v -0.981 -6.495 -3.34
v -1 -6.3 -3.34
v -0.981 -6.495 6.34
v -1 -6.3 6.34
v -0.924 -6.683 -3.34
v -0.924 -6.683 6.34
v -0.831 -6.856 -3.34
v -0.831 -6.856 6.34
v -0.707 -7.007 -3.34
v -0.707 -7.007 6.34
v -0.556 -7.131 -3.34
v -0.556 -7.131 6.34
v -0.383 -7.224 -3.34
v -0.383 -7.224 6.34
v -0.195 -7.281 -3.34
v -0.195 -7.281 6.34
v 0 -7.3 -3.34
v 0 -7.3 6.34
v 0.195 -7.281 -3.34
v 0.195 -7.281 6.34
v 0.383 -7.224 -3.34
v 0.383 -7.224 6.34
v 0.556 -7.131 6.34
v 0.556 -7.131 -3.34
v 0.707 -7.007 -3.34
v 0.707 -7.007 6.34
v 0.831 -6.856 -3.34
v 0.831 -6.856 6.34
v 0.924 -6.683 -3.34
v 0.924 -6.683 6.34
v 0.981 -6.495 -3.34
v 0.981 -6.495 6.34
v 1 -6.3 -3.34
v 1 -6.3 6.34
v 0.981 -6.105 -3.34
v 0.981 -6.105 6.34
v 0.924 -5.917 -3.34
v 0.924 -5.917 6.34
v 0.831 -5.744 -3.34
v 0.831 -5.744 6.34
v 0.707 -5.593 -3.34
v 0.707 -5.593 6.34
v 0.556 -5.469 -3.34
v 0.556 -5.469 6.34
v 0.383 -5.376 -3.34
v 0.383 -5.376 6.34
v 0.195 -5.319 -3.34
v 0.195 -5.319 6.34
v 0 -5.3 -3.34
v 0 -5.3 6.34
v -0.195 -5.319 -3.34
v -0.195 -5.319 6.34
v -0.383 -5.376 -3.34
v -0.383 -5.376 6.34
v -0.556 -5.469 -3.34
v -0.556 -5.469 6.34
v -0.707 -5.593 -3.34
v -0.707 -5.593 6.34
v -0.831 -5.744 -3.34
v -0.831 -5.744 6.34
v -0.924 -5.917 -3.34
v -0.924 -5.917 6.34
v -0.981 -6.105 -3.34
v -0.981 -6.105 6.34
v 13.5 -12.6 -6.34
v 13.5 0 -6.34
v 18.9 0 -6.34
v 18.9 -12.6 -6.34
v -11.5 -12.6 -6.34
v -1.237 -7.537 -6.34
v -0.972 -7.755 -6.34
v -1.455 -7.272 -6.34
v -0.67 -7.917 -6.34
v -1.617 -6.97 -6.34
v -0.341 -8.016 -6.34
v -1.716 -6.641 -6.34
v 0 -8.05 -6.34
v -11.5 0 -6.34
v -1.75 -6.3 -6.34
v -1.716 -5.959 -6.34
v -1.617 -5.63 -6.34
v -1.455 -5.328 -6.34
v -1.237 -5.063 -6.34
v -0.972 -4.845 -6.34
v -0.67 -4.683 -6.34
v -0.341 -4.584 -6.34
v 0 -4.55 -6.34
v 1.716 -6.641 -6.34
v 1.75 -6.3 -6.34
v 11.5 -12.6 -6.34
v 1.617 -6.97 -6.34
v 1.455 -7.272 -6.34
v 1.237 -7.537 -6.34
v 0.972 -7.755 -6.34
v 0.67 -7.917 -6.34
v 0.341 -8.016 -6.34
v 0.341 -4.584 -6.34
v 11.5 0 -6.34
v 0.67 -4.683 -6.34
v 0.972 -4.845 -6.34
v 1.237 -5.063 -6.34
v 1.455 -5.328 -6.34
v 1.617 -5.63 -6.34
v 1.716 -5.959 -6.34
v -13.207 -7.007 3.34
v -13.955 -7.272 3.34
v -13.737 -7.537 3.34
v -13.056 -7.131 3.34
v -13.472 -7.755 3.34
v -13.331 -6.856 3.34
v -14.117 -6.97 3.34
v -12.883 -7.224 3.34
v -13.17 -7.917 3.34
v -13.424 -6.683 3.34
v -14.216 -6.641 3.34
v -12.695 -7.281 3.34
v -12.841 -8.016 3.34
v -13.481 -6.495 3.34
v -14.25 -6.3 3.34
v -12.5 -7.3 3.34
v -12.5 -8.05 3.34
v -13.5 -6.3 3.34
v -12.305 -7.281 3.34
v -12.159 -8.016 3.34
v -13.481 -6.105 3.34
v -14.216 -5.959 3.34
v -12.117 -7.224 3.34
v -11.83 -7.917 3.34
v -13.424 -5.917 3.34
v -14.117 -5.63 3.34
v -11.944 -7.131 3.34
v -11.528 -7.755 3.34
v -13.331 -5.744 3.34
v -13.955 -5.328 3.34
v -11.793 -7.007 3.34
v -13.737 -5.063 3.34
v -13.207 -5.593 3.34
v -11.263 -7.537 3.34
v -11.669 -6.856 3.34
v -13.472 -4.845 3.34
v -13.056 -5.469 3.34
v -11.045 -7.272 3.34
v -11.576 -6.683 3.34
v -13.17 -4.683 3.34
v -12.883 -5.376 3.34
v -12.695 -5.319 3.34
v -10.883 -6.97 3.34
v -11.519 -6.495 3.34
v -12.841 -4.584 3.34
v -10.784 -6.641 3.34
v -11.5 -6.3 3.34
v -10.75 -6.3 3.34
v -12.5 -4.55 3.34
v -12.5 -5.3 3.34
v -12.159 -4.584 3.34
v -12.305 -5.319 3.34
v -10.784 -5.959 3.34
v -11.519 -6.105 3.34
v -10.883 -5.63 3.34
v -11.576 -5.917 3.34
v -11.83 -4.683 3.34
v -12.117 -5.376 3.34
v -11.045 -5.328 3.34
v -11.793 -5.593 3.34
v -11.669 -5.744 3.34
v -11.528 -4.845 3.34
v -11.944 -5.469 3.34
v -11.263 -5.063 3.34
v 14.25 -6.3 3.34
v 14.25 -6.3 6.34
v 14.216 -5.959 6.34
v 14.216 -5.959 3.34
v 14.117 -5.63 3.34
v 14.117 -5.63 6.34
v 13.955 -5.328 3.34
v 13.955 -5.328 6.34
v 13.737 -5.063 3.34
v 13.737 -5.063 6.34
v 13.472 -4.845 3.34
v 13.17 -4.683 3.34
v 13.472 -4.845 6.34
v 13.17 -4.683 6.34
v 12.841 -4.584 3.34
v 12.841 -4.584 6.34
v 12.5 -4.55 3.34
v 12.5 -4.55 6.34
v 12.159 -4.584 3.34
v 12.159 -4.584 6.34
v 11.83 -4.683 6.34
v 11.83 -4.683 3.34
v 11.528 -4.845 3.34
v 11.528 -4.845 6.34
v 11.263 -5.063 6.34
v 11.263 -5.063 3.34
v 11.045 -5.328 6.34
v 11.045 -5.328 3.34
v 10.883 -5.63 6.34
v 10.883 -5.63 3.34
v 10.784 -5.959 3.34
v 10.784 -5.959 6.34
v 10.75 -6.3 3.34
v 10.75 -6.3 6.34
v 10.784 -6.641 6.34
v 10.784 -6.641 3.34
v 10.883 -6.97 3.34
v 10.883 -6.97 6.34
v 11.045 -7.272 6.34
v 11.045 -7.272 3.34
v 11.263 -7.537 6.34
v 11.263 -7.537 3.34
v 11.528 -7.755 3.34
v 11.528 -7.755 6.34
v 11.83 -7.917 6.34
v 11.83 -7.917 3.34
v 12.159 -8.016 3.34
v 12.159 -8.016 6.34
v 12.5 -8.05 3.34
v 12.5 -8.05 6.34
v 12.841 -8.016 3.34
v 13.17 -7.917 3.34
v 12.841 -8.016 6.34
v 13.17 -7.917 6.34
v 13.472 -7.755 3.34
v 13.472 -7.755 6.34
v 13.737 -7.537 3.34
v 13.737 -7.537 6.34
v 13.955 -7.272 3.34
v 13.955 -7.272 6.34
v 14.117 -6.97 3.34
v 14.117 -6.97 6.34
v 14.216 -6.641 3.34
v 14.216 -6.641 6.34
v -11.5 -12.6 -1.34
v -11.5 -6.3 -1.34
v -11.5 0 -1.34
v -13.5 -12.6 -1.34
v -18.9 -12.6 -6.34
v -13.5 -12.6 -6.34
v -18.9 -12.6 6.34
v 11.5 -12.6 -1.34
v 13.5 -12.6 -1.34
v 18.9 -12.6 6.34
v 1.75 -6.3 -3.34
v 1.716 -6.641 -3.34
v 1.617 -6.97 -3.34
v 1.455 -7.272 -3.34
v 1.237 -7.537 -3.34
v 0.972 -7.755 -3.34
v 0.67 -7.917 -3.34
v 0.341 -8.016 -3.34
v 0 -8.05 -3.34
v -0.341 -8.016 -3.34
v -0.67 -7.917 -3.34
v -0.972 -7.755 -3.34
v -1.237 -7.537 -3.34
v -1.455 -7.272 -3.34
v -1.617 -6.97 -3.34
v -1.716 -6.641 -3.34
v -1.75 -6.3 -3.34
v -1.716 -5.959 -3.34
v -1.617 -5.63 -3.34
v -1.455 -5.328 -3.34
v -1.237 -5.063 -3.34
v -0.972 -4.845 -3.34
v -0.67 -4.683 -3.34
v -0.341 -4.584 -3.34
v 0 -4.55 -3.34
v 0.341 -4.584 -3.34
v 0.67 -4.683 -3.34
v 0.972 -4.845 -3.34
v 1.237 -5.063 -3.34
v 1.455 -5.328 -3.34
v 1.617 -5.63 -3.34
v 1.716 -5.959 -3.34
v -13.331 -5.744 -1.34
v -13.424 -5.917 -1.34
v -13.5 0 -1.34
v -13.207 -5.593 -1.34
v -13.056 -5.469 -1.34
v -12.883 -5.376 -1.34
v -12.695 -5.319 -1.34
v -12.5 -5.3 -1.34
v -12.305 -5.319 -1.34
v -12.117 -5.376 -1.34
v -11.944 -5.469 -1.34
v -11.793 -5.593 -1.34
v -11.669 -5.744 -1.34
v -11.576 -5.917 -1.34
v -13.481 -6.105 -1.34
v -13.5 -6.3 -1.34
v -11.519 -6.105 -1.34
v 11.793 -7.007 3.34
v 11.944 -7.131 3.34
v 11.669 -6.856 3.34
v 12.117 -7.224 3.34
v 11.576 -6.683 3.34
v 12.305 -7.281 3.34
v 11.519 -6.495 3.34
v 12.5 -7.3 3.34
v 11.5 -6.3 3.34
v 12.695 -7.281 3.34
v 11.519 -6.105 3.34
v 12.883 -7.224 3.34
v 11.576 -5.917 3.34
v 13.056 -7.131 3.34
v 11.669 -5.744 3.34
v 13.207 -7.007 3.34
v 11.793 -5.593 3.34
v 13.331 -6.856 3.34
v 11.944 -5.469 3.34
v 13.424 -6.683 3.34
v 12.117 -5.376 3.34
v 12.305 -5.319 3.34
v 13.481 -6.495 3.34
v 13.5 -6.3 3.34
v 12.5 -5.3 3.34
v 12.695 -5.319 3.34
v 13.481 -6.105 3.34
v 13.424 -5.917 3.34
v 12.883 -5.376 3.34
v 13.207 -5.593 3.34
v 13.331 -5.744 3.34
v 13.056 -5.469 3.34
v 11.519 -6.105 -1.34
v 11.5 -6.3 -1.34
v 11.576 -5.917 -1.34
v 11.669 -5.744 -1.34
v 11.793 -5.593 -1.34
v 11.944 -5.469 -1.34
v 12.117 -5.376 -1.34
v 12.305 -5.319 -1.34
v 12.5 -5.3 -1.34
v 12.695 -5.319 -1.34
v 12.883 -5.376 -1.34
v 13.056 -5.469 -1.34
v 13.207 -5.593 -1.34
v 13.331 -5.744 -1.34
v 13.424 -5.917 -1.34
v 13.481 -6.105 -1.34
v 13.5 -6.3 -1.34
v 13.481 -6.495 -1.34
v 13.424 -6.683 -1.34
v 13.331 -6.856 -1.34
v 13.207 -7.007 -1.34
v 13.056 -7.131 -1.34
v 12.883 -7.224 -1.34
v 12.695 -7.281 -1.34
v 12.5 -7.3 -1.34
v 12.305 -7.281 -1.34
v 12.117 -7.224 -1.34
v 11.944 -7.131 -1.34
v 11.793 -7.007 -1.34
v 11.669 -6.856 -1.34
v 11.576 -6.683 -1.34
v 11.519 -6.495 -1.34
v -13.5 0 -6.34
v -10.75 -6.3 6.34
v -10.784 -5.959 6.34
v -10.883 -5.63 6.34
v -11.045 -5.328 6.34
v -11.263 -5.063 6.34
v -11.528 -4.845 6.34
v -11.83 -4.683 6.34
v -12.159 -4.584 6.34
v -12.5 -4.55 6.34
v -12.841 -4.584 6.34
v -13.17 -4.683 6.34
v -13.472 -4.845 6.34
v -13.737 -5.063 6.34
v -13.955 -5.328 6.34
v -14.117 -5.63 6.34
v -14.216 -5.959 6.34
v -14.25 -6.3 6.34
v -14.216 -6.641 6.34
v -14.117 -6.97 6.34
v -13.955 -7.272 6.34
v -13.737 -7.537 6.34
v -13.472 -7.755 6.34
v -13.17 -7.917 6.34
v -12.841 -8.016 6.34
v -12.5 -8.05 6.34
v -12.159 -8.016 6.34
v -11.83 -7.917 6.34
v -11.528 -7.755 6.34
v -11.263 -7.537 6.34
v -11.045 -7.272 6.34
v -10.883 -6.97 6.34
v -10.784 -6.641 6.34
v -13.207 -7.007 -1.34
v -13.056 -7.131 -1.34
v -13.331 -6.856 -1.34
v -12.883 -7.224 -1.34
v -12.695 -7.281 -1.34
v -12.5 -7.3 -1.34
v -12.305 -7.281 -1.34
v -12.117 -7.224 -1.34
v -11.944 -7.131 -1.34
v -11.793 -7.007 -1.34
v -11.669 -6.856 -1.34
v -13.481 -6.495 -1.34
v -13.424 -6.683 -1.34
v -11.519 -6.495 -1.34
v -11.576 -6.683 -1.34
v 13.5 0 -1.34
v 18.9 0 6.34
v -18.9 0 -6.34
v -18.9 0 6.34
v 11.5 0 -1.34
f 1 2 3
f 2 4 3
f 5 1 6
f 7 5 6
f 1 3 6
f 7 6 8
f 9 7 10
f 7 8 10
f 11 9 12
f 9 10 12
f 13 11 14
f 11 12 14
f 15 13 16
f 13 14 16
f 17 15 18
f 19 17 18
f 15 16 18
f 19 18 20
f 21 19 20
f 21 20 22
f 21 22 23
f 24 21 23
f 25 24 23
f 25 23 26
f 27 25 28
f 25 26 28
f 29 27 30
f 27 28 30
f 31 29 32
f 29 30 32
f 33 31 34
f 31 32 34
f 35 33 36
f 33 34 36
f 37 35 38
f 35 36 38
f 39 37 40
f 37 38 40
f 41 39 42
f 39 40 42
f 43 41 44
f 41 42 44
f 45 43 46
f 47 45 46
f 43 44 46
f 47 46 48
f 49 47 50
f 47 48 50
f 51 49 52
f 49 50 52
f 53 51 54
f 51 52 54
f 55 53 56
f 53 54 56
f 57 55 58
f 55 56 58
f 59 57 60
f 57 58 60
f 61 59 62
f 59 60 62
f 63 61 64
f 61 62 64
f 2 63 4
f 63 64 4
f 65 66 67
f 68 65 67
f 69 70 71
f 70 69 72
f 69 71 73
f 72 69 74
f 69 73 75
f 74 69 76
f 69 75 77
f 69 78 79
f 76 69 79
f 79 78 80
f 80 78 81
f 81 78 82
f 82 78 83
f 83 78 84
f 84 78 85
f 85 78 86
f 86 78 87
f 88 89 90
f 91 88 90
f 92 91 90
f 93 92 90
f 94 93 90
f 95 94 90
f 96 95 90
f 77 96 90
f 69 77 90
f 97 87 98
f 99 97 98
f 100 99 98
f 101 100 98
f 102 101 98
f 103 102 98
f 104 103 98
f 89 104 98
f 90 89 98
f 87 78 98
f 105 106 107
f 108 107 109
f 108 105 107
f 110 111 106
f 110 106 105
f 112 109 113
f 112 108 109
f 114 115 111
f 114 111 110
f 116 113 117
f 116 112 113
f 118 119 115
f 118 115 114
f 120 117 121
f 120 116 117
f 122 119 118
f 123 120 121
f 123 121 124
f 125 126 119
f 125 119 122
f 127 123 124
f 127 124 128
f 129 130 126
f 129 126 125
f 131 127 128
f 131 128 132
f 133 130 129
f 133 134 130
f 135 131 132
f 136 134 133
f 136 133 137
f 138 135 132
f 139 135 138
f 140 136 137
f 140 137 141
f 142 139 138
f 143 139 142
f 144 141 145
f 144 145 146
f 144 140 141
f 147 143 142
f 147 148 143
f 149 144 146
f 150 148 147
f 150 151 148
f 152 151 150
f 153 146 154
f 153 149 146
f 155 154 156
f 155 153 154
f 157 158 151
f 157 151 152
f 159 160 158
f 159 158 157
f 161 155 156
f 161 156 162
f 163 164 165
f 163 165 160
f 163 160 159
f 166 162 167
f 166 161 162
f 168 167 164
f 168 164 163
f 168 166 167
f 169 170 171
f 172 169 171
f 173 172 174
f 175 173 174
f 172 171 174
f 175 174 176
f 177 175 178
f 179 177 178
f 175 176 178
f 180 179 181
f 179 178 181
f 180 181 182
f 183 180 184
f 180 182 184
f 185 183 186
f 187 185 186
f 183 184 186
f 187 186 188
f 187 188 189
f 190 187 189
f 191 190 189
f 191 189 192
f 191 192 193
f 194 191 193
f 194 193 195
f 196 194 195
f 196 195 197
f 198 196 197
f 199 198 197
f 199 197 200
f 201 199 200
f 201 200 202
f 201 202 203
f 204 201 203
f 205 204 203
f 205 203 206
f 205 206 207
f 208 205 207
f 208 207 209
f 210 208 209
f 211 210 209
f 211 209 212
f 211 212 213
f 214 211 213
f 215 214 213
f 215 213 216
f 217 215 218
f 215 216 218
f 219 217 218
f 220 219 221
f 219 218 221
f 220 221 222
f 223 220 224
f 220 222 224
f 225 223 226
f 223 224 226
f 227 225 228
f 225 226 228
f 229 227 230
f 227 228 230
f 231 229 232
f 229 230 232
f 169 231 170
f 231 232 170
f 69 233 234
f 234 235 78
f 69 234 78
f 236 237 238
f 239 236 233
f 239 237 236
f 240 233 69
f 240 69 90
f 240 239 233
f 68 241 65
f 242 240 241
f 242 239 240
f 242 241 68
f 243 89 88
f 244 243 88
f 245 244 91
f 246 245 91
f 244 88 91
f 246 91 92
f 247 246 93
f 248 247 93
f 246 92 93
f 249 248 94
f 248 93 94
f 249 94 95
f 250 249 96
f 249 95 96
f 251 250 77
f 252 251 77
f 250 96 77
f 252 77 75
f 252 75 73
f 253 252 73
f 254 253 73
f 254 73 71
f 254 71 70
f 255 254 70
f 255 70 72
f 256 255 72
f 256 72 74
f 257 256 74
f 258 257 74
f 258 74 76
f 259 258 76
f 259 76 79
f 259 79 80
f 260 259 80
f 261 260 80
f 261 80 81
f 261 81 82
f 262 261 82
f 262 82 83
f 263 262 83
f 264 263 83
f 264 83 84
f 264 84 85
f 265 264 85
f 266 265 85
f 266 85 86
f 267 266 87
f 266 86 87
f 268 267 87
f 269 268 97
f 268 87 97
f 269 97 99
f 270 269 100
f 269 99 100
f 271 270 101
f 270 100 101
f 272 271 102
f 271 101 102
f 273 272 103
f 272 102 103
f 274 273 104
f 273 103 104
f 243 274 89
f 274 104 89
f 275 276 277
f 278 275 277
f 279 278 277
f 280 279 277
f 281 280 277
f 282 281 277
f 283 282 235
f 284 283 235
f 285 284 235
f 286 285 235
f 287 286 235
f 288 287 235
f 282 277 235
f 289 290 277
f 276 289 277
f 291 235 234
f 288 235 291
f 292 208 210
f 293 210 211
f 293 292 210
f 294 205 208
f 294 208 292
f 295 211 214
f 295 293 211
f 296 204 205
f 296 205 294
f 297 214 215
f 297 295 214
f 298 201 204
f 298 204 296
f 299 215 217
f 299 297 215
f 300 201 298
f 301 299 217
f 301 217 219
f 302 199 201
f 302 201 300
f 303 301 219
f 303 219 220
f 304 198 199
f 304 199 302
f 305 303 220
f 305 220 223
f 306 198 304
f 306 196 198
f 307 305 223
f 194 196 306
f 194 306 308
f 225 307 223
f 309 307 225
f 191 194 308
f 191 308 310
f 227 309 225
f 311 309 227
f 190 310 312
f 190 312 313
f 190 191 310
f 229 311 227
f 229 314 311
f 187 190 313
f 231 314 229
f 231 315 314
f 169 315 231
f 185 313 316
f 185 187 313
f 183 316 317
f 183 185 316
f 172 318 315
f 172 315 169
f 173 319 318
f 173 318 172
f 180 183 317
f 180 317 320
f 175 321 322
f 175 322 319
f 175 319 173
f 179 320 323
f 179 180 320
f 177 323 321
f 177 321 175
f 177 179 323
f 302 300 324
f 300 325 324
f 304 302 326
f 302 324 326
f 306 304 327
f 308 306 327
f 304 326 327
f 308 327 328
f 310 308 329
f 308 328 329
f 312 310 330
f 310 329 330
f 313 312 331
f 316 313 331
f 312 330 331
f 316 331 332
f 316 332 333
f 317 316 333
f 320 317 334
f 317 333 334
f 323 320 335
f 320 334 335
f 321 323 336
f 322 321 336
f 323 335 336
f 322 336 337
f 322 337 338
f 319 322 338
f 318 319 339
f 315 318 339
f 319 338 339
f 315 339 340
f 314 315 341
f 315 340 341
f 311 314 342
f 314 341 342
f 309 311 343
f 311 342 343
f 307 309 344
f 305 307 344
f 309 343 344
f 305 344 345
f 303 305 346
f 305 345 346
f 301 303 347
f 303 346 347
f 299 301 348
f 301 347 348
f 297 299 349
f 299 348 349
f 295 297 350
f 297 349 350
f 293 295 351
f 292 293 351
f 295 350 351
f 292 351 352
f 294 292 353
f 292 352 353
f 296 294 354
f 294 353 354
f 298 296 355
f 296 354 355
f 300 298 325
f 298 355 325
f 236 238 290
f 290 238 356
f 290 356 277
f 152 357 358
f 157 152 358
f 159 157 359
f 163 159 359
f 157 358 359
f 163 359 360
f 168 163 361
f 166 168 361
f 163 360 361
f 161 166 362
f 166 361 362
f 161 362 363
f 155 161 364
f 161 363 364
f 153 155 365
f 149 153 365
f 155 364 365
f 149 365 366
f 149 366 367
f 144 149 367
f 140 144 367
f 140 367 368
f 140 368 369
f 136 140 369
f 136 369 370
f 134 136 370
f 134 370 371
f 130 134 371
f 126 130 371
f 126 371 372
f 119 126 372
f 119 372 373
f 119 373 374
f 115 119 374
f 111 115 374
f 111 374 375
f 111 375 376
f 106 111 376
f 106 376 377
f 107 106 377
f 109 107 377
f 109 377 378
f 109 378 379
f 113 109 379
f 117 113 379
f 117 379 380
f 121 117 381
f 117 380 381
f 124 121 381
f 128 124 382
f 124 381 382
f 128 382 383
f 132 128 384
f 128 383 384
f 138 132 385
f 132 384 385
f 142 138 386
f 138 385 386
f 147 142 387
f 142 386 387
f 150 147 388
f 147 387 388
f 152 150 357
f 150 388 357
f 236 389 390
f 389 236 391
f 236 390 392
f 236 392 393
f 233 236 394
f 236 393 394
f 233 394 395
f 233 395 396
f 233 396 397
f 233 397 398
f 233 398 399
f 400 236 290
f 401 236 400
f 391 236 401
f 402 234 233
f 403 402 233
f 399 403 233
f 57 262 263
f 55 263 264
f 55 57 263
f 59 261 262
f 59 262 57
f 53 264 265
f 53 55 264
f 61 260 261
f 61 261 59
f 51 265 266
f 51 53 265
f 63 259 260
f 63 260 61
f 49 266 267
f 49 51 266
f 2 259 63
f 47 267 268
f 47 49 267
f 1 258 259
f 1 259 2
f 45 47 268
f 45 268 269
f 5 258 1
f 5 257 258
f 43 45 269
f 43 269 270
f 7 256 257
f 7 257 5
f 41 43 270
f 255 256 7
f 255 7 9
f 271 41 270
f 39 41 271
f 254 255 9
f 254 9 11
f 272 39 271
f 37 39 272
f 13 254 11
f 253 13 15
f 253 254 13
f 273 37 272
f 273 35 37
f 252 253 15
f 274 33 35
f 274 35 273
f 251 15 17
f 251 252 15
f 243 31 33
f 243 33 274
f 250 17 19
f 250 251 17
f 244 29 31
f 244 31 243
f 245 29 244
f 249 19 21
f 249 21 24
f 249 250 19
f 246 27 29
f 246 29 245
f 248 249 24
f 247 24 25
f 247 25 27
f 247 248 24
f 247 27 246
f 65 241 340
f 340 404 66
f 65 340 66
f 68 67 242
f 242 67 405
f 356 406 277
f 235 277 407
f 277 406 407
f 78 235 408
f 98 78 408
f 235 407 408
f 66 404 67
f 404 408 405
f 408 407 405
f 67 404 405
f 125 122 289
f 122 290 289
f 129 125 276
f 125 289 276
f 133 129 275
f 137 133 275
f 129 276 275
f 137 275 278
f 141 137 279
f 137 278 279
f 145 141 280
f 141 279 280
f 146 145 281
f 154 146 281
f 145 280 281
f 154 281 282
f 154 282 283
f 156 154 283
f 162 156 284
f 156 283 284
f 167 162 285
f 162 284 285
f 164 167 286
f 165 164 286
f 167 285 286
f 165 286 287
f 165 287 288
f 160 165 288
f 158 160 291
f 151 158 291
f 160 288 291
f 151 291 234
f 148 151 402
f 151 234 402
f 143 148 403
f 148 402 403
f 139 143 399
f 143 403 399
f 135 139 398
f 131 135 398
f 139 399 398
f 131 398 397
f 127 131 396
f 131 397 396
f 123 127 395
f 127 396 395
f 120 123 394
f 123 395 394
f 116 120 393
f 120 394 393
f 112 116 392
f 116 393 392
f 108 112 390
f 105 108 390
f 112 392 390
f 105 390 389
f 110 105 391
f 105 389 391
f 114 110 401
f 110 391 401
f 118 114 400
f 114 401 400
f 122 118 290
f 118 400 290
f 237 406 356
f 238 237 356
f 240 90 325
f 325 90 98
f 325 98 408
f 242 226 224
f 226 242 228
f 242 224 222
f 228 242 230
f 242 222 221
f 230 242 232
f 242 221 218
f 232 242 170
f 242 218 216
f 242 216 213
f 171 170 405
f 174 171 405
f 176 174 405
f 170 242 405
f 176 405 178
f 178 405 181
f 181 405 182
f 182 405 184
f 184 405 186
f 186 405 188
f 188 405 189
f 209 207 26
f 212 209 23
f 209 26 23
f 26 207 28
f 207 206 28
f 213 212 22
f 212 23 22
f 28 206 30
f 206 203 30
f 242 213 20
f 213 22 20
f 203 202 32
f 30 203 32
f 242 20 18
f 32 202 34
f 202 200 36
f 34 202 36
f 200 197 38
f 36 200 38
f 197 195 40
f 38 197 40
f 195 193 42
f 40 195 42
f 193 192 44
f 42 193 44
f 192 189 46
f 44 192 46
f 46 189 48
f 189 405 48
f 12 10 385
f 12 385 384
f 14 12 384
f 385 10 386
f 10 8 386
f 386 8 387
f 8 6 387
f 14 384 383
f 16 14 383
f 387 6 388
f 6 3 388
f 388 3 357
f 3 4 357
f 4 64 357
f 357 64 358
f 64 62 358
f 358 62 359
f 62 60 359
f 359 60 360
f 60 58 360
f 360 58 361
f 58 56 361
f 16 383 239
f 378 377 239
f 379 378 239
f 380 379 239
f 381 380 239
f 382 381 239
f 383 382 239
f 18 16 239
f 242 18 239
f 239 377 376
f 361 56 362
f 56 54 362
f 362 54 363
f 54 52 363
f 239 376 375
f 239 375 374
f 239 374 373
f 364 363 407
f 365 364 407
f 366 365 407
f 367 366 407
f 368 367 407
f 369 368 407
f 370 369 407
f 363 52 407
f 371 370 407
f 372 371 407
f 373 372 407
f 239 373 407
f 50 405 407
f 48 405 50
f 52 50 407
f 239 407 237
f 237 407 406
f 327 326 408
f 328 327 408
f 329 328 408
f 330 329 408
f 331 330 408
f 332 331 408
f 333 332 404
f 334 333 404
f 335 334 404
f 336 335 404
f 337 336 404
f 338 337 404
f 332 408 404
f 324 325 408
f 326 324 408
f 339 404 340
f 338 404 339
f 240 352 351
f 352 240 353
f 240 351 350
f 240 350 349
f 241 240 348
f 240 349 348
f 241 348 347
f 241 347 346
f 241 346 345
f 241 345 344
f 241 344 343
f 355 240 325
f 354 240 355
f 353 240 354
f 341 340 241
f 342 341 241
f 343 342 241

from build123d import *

# Parameters (mm, degrees)
F1_DEPTH       = 12.6
F4_D           = 2
F4_DEPTH       = 38
F4_CBORE_D     = 3.5
F4_CBORE_DEPTH = 3
F5_D           = 2
F5_DEPTH       = 38
F5_CBORE_D     = 3.5
F5_CBORE_DEPTH = 3


with BuildPart() as f1:
    # F0 (on Front) → F1 (new body)
    with BuildSketch(Plane.XZ):
        Polygon((18.9, 6.34), (-18.9, 6.34), (-18.9, -6.34), (-13.5, -6.34), (-13.5, -1.34), (-11.5, -1.34), (-11.5, -6.34), (11.5, -6.34), (11.5, -1.34), (13.5, -1.34), (13.5, -6.34), (18.9, -6.34), align=None)
    extrude(amount=F1_DEPTH)

    # F4
    with Locations(Plane(origin=(0, 0, -6.34), x_dir=(1, 0, 0), z_dir=(0, 0, -1))):
        with Locations((0, 6.3)):
            CounterBoreHole(F4_D / 2, F4_CBORE_D / 2, F4_CBORE_DEPTH, depth=F4_DEPTH)

    # F5
    with Locations(Plane.XY.offset(6.34)):
        with Locations((-12.5, -6.3), (12.5, -6.3)):
            CounterBoreHole(F5_D / 2, F5_CBORE_D / 2, F5_CBORE_DEPTH, depth=F5_DEPTH)


solid = f1.part
